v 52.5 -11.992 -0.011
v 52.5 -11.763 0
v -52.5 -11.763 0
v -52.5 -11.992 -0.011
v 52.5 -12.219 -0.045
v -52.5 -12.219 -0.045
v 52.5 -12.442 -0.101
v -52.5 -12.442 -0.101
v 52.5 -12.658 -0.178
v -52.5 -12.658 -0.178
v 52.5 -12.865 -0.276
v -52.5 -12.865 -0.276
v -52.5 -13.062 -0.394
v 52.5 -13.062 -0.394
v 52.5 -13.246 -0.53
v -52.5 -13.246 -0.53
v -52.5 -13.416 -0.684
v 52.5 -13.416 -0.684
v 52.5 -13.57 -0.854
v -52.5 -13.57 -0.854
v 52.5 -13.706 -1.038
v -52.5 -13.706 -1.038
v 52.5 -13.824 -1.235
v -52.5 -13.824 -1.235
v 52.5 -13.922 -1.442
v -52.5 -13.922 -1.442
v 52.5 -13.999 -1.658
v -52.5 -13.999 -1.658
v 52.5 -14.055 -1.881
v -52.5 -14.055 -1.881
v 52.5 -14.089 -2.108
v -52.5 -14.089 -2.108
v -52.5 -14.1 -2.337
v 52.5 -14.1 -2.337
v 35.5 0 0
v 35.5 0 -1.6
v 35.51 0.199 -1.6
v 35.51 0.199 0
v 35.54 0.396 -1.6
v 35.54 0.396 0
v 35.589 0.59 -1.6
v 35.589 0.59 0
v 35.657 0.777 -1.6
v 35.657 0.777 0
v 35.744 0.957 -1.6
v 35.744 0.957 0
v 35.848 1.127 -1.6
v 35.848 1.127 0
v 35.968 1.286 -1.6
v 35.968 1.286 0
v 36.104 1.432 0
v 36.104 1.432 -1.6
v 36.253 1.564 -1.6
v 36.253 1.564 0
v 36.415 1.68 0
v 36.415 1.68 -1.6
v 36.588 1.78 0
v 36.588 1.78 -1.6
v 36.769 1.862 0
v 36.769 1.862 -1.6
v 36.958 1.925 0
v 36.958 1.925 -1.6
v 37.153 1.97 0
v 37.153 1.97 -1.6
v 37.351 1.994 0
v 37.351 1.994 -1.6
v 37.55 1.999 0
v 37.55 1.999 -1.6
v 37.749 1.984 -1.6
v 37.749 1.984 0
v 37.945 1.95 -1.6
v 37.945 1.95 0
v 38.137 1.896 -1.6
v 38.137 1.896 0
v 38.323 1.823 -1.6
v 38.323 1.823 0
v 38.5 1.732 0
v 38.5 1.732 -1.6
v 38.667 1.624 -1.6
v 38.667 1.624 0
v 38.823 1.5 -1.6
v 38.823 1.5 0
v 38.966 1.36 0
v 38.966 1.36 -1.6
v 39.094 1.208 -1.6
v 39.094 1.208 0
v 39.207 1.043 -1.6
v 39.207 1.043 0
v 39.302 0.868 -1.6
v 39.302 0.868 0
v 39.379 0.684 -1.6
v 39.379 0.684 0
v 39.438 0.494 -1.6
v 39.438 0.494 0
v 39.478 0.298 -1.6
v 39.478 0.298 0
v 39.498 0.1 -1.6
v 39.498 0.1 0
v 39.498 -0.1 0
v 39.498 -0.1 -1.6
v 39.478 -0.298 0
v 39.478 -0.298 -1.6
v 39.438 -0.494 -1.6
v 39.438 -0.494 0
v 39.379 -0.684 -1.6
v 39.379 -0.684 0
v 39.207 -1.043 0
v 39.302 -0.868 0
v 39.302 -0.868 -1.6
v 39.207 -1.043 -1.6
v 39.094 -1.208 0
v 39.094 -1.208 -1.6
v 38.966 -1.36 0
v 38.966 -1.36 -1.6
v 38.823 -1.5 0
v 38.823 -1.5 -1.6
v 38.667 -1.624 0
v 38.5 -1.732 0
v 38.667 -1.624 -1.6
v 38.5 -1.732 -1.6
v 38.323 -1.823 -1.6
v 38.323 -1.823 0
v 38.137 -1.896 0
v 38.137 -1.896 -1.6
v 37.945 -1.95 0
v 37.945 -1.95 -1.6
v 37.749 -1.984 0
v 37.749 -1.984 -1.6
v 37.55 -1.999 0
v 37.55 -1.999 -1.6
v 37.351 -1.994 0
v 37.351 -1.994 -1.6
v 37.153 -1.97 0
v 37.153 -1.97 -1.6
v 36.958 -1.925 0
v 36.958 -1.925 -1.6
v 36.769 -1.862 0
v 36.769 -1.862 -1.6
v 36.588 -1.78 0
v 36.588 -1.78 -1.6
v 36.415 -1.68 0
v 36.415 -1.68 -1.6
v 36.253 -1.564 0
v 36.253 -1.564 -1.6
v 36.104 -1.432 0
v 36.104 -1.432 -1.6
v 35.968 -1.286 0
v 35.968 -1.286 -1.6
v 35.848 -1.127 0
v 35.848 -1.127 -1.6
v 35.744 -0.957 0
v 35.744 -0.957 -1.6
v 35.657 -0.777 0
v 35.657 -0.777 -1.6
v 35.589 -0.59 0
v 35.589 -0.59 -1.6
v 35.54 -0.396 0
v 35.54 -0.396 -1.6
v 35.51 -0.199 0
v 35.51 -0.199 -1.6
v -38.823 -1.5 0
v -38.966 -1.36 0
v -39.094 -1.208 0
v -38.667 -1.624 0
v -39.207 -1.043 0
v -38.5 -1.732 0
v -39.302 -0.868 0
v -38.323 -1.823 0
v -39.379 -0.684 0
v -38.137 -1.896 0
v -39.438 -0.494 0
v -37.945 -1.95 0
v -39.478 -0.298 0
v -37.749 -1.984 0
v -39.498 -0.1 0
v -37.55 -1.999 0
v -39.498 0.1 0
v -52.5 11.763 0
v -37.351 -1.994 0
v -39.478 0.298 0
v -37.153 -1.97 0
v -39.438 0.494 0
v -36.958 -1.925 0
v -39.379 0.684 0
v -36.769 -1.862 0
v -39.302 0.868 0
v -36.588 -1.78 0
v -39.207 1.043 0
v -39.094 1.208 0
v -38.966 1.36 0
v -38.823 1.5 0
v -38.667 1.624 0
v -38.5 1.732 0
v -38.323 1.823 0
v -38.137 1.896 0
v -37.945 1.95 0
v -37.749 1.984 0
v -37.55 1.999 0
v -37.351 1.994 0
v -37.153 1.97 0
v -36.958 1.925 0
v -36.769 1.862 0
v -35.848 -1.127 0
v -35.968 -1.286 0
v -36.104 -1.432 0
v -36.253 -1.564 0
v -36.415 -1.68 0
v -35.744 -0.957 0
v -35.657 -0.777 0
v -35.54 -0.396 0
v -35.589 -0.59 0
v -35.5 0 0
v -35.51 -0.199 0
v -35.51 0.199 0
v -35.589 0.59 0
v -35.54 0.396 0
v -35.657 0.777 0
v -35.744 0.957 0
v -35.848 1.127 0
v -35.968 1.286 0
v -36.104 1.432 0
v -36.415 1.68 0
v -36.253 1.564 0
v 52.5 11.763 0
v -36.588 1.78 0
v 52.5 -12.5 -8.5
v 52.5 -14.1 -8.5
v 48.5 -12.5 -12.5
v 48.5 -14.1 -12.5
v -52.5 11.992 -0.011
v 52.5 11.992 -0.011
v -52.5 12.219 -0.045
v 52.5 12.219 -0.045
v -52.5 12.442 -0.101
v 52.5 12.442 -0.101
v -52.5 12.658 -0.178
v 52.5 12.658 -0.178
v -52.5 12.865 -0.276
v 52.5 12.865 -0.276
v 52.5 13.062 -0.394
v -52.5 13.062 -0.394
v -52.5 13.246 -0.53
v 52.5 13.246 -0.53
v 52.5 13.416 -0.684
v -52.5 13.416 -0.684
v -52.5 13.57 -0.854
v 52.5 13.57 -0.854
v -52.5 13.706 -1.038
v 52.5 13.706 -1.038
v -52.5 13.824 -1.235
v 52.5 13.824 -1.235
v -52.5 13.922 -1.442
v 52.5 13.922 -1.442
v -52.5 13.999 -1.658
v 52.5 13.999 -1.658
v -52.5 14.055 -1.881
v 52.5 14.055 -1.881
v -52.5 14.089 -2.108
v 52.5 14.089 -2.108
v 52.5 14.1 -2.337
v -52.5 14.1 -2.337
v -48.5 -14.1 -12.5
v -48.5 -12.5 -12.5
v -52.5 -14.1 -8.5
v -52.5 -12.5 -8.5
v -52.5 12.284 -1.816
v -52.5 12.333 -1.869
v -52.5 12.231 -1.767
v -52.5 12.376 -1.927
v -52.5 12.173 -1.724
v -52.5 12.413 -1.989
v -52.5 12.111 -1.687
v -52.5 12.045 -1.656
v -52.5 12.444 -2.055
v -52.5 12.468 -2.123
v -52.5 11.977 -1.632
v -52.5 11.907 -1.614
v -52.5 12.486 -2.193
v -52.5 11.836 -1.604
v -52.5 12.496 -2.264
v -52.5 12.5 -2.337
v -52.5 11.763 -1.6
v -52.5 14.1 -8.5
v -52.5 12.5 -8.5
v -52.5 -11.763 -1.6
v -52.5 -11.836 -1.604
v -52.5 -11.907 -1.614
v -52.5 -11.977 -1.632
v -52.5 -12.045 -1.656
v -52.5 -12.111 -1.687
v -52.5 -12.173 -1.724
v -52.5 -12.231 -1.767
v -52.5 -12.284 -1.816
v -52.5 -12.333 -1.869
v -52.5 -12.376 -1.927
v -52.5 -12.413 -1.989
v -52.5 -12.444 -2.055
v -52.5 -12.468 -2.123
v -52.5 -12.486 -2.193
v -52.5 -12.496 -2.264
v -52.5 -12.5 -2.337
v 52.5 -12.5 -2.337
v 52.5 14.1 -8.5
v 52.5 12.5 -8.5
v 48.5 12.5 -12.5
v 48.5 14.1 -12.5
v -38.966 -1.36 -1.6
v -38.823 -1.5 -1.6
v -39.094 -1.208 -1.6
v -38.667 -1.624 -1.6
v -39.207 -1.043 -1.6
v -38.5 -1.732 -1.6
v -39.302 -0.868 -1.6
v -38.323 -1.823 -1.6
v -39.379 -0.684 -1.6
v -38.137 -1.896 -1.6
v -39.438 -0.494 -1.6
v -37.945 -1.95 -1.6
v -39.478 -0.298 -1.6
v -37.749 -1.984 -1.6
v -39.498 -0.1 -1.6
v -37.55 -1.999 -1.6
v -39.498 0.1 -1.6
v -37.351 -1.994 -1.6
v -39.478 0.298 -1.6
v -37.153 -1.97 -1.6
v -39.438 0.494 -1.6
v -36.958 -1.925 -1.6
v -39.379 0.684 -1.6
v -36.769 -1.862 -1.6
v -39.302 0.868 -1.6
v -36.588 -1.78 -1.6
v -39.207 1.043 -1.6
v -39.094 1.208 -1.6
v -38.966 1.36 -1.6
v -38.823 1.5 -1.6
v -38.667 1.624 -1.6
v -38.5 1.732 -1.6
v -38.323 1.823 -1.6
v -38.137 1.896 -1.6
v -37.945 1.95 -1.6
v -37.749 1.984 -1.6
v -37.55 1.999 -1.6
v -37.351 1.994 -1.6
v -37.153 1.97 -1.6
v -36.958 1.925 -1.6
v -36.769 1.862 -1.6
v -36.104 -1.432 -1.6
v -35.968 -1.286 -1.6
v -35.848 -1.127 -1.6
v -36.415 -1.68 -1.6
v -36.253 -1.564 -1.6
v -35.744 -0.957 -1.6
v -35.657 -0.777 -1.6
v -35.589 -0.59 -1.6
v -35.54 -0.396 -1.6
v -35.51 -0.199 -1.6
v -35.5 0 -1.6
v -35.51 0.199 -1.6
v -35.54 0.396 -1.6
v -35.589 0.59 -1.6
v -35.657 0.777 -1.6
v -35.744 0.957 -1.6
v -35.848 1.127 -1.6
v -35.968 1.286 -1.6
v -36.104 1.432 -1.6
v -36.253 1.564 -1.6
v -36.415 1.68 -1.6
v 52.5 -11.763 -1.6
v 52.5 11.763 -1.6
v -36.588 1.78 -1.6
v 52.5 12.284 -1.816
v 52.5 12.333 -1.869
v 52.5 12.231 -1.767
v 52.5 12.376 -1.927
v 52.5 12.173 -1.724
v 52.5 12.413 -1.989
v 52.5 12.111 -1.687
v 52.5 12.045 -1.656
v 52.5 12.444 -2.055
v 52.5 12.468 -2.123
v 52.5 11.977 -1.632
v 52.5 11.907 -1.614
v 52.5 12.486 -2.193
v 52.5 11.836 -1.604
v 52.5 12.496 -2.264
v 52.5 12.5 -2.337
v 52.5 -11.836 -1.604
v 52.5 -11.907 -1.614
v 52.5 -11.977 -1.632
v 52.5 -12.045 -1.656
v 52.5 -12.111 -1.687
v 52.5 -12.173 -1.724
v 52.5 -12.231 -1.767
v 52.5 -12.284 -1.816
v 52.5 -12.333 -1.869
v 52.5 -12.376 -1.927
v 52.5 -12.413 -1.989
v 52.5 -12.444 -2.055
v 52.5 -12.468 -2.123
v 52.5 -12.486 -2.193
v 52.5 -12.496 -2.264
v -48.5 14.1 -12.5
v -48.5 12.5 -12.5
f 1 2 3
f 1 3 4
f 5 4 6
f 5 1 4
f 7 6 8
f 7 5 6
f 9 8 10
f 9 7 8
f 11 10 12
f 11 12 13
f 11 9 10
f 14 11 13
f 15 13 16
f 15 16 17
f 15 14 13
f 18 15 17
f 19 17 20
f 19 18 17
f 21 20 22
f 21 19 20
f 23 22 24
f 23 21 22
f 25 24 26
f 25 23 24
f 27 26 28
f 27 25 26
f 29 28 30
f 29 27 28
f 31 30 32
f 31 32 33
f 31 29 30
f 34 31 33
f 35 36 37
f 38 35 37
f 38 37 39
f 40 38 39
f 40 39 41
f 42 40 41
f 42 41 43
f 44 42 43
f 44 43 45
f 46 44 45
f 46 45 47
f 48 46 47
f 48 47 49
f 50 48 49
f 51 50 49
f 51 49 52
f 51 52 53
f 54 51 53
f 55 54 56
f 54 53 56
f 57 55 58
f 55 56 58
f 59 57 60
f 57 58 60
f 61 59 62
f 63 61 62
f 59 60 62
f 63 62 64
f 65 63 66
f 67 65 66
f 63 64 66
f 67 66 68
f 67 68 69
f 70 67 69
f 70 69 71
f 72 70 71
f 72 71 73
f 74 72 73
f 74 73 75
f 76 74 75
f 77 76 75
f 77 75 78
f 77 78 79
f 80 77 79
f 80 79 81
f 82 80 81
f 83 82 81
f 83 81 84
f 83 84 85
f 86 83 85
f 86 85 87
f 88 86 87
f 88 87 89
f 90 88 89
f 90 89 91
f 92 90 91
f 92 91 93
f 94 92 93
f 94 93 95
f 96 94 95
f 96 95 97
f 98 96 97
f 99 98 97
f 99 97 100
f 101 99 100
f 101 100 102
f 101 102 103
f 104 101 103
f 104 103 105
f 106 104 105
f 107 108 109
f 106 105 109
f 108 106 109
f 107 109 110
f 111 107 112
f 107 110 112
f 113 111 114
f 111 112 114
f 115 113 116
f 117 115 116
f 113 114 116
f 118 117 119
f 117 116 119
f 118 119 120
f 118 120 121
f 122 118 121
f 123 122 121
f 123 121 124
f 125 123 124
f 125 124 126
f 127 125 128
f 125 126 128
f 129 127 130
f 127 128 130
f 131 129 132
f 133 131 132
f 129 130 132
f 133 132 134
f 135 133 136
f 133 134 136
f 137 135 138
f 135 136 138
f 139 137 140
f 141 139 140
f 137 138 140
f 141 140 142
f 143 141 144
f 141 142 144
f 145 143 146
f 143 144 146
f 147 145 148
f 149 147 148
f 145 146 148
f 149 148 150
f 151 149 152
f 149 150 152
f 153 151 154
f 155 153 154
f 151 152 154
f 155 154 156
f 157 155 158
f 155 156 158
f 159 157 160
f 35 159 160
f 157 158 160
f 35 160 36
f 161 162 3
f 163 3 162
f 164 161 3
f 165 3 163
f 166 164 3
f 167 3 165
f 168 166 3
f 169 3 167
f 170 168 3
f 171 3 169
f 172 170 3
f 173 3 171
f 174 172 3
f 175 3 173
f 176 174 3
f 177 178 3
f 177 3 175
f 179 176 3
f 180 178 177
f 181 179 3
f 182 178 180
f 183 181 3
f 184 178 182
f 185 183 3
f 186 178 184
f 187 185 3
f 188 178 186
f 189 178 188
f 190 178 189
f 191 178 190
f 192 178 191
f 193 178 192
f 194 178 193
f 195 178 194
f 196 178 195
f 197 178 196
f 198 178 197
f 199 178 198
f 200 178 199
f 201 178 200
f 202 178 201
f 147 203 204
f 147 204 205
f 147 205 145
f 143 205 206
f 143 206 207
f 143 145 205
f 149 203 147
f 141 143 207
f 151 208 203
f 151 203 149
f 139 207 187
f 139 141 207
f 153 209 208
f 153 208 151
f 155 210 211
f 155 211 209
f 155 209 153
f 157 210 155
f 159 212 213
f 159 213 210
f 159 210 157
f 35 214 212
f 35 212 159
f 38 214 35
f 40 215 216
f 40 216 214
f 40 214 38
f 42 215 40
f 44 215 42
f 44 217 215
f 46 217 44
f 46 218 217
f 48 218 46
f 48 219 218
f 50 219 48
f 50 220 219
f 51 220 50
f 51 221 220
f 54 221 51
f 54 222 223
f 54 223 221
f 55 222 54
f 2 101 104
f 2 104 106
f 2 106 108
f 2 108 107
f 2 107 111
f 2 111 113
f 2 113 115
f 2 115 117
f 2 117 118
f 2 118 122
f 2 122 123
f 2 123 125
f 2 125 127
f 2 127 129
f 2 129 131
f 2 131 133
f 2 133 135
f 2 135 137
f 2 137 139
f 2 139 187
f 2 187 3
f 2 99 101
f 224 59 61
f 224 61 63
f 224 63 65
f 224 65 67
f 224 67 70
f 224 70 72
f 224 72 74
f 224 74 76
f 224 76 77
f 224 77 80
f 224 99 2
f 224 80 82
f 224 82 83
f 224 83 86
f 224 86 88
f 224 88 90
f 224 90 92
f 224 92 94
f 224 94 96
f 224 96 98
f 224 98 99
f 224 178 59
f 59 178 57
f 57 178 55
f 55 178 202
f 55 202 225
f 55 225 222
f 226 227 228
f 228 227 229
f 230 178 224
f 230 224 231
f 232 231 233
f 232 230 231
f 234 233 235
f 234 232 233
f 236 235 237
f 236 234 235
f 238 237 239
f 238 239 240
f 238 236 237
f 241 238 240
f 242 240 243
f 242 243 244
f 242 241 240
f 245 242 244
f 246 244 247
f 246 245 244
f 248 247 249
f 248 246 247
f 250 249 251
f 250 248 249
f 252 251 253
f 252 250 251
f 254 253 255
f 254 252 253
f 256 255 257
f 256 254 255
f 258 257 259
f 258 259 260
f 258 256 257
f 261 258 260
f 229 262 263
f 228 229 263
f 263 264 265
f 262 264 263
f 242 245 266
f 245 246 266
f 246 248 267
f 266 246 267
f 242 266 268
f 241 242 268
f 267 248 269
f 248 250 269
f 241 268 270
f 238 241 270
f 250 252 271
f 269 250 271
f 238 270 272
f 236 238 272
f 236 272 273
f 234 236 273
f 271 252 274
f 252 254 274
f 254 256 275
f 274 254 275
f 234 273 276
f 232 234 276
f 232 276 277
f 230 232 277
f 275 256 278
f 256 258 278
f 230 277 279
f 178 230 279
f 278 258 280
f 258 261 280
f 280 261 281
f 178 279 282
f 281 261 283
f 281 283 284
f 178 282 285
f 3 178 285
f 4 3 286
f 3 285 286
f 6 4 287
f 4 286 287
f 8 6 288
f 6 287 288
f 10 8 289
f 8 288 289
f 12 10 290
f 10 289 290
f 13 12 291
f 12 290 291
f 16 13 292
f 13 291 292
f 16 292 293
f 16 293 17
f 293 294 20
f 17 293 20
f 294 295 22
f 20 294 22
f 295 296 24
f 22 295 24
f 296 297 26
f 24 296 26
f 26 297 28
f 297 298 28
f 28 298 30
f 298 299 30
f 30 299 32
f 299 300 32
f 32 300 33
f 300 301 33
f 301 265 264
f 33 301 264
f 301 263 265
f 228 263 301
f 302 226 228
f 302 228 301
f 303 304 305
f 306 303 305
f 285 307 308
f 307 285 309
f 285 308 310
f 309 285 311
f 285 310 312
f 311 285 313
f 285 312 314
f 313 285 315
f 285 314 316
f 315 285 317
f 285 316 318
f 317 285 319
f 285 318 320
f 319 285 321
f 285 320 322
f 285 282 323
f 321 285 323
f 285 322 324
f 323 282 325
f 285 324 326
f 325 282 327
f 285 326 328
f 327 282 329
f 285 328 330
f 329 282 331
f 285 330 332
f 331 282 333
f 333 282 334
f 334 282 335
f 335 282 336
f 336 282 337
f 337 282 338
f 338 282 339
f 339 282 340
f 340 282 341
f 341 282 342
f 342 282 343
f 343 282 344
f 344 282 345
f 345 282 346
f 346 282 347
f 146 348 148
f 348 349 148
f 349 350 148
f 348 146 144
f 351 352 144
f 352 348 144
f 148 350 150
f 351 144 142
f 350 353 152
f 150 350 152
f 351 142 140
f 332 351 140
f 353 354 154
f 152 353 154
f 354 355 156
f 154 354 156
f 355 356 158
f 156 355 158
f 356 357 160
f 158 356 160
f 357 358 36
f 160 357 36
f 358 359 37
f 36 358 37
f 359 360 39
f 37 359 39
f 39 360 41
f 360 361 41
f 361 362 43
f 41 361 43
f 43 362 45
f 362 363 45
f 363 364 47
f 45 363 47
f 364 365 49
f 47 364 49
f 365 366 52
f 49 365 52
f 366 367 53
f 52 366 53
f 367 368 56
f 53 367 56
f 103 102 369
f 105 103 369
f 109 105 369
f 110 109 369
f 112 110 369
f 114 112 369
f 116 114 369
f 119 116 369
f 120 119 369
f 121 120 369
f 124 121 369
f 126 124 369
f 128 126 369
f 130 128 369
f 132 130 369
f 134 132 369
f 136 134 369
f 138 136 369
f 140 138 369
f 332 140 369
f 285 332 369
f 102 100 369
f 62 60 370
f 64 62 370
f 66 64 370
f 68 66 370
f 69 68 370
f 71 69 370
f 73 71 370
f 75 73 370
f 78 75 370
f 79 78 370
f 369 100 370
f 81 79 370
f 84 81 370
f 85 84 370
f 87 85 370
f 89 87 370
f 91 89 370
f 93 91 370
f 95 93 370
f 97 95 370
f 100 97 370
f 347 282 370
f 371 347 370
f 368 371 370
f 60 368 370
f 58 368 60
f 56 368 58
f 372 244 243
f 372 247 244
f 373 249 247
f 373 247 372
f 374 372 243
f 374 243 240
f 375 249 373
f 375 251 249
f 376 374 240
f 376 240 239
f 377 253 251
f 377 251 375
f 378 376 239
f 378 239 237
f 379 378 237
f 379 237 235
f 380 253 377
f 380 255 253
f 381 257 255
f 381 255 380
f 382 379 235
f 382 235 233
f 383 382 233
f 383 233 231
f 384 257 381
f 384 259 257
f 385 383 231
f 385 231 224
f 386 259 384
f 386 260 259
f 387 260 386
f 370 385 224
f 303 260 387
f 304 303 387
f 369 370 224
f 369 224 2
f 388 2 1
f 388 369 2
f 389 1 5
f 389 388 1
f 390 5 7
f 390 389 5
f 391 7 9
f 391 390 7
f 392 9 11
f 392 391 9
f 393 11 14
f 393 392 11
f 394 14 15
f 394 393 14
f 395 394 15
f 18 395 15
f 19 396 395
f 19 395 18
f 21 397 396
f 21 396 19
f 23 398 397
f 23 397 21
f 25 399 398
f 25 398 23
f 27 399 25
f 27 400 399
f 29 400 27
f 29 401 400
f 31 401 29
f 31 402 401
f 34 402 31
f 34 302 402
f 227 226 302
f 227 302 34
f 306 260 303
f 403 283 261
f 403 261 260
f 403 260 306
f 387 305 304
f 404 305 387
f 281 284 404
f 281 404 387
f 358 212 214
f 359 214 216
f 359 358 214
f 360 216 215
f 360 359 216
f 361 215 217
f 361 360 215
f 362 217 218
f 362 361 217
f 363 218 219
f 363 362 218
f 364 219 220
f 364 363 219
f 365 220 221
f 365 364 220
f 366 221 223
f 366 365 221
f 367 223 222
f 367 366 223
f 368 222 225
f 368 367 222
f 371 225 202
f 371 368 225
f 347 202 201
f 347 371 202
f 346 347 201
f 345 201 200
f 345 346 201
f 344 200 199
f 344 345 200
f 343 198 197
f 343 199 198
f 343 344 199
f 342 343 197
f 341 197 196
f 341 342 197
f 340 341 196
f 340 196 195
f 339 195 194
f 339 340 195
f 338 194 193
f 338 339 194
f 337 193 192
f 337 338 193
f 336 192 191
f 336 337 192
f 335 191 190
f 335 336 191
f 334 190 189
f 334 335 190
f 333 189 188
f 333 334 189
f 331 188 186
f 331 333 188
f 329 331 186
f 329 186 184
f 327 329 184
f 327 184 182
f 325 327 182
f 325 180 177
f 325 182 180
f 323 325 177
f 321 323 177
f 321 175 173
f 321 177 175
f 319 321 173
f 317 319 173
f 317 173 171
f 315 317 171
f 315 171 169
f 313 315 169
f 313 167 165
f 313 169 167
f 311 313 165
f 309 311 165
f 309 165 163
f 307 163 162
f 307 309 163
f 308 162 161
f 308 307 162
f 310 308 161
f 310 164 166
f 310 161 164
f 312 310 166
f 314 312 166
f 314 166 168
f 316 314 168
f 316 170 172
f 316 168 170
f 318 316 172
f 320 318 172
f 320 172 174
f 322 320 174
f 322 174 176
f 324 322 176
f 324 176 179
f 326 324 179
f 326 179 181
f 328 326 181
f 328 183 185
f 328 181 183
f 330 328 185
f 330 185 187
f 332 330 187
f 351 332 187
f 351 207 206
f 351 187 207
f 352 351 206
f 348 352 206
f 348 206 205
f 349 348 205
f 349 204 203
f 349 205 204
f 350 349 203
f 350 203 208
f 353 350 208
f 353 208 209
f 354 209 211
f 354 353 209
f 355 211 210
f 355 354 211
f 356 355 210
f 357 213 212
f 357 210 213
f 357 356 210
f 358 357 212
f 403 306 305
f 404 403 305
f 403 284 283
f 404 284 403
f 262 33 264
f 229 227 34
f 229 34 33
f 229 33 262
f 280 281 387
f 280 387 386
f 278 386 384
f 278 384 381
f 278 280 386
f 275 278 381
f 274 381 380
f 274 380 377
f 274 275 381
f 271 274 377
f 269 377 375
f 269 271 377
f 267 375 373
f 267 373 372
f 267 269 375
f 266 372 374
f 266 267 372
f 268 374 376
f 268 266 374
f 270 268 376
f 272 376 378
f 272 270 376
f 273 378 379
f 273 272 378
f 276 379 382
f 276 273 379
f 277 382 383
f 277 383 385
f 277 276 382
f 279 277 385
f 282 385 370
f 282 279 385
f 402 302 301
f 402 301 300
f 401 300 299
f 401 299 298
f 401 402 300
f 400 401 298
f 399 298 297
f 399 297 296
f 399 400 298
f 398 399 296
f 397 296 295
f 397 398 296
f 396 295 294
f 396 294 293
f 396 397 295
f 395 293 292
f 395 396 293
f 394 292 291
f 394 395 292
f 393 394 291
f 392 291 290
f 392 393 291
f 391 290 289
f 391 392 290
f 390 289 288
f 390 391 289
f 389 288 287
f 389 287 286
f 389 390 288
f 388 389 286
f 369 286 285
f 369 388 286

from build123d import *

# Parameters (mm, degrees)
SKETCH_1_W                         = 105
SKETCH_1_H                         = 25
SM_BASE_FLANGE_1_DEPTH             = 1.6
SM_EDGE_FLANGE_1_STRIP_W           = 7.8732
SM_EDGE_FLANGE_1_STRIP_H           = 1.6
SM_EDGE_FLANGE_1_STRIP_CUT_DEPTH   = 105
SM_EDGE_FLANGE_1_STRIP_2_W         = 7.8732
SM_EDGE_FLANGE_1_STRIP_2_H         = 1.6
SM_EDGE_FLANGE_1_STRIP_CUT_2_DEPTH = 105
SM_EDGE_FLANGE_1_DEPTH             = 105
SM_EDGE_FLANGE_1_BEND_DEPTH        = 105
CUT_EXTRUDE_1_DEPTH                = 56.779117956
CUT_EXTRUDE_1_DEPTH_BACK           = 56.779117956
SKETCH_13_R                        = 2
CUT_EXTRUDE_2_DEPTH                = 56.442492729


# Sheet-metal steps are written as plain solids
with BuildPart() as part:
    # Sketch 1 → 基体-法兰1 (new body)
    with BuildSketch(Plane.XY):
        Rectangle(SKETCH_1_W, SKETCH_1_H)
    extrude(amount=-SM_BASE_FLANGE_1_DEPTH)

    # 边线-法兰1 strip (across the edge) → 边线-法兰1 strip cut (cut)
    with BuildSketch(Plane(origin=(-52.5, 12.5, -1.6), x_dir=(0, -1, 0), z_dir=(1, 0, 0))):
        with Locations((-3.2, -0.8)):
            Rectangle(SM_EDGE_FLANGE_1_STRIP_W, SM_EDGE_FLANGE_1_STRIP_H)
    extrude(amount=SM_EDGE_FLANGE_1_STRIP_CUT_DEPTH, mode=Mode.SUBTRACT)

    # 边线-法兰1 strip 2 (across the edge) → 边线-法兰1 strip cut 2 (cut)
    with BuildSketch(Plane(origin=(52.5, -12.5, -1.6), x_dir=(0, 1, 0), z_dir=(-1, 0, 0))):
        with Locations((-3.2, -0.8)):
            Rectangle(SM_EDGE_FLANGE_1_STRIP_2_W, SM_EDGE_FLANGE_1_STRIP_2_H)
    extrude(amount=SM_EDGE_FLANGE_1_STRIP_CUT_2_DEPTH, mode=Mode.SUBTRACT)

    # 边线-法兰1 section (across the edge) → 边线-法兰1 (add)
    with BuildSketch(Plane(origin=(-52.5, 12.5, -1.6), x_dir=(0, -1, 0), z_dir=(1, 0, 0))):
        with BuildLine():
            Line((-1.6, 0.7366), (-1.6, 10.9))
            Line((-1.6, 10.9), (0, 10.9))
            Line((0, 10.9), (0, 0.7366))
            ThreePointArc((0, 0.7366), (0.215745145, 0.215745145), (0.7366, 0))
            Line((0.7366, 0), (0.7366, -1.6))
            ThreePointArc((0.7366, -1.6), (-0.915625705, -0.915625705), (-1.6, 0.7366))
        make_face()
    extrude(amount=SM_EDGE_FLANGE_1_DEPTH)

    # 边线-法兰1 section 2 (across the edge) → 边线-法兰1 bend (add)
    with BuildSketch(Plane(origin=(52.5, -12.5, -1.6), x_dir=(0, 1, 0), z_dir=(-1, 0, 0))):
        with BuildLine():
            Line((-1.6, 0.7366), (-1.6, 10.9))
            Line((-1.6, 10.9), (0, 10.9))
            Line((0, 10.9), (0, 0.7366))
            ThreePointArc((0, 0.7366), (0.215745145, 0.215745145), (0.7366, 0))
            Line((0.7366, 0), (0.7366, -1.6))
            ThreePointArc((0.7366, -1.6), (-0.915625705, -0.915625705), (-1.6, 0.7366))
        make_face()
    extrude(amount=SM_EDGE_FLANGE_1_BEND_DEPTH)

    # 草图12 → 切除-拉伸1 (cut, two sides: drawn at the far end of the back side and taken through both)
    with BuildSketch(Plane(origin=(0, 0, 0), x_dir=(1, 0, 0), z_dir=(0, 1, 0)).offset(-CUT_EXTRUDE_1_DEPTH_BACK)):
        Polygon((-52.5, 8.5), (-48.5, 12.5), (-52.5, 12.5), align=None)
        Polygon((48.5, 12.5), (52.5, 12.5), (52.5, 8.5), align=None)
    extrude(amount=CUT_EXTRUDE_1_DEPTH + CUT_EXTRUDE_1_DEPTH_BACK, mode=Mode.SUBTRACT)

    # 草图13 → 切除-拉伸2 (cut, through all)
    with BuildSketch(Plane(origin=(0, 0, -1.6), x_dir=(-1, 0, 0), z_dir=(0, 0, -1))):
        with Locations((-37.5, 0)):
            Circle(SKETCH_13_R)
    cut_extrude_2 = extrude(amount=-CUT_EXTRUDE_2_DEPTH, mode=Mode.SUBTRACT)

    # 镜向1: 切除-拉伸2 across plane
    add(cut_extrude_2.mirror(Plane(origin=(0, 0, 0), x_dir=(0, 0, 1), z_dir=(1, 0, 0))), mode=Mode.SUBTRACT)


solid = part.part
